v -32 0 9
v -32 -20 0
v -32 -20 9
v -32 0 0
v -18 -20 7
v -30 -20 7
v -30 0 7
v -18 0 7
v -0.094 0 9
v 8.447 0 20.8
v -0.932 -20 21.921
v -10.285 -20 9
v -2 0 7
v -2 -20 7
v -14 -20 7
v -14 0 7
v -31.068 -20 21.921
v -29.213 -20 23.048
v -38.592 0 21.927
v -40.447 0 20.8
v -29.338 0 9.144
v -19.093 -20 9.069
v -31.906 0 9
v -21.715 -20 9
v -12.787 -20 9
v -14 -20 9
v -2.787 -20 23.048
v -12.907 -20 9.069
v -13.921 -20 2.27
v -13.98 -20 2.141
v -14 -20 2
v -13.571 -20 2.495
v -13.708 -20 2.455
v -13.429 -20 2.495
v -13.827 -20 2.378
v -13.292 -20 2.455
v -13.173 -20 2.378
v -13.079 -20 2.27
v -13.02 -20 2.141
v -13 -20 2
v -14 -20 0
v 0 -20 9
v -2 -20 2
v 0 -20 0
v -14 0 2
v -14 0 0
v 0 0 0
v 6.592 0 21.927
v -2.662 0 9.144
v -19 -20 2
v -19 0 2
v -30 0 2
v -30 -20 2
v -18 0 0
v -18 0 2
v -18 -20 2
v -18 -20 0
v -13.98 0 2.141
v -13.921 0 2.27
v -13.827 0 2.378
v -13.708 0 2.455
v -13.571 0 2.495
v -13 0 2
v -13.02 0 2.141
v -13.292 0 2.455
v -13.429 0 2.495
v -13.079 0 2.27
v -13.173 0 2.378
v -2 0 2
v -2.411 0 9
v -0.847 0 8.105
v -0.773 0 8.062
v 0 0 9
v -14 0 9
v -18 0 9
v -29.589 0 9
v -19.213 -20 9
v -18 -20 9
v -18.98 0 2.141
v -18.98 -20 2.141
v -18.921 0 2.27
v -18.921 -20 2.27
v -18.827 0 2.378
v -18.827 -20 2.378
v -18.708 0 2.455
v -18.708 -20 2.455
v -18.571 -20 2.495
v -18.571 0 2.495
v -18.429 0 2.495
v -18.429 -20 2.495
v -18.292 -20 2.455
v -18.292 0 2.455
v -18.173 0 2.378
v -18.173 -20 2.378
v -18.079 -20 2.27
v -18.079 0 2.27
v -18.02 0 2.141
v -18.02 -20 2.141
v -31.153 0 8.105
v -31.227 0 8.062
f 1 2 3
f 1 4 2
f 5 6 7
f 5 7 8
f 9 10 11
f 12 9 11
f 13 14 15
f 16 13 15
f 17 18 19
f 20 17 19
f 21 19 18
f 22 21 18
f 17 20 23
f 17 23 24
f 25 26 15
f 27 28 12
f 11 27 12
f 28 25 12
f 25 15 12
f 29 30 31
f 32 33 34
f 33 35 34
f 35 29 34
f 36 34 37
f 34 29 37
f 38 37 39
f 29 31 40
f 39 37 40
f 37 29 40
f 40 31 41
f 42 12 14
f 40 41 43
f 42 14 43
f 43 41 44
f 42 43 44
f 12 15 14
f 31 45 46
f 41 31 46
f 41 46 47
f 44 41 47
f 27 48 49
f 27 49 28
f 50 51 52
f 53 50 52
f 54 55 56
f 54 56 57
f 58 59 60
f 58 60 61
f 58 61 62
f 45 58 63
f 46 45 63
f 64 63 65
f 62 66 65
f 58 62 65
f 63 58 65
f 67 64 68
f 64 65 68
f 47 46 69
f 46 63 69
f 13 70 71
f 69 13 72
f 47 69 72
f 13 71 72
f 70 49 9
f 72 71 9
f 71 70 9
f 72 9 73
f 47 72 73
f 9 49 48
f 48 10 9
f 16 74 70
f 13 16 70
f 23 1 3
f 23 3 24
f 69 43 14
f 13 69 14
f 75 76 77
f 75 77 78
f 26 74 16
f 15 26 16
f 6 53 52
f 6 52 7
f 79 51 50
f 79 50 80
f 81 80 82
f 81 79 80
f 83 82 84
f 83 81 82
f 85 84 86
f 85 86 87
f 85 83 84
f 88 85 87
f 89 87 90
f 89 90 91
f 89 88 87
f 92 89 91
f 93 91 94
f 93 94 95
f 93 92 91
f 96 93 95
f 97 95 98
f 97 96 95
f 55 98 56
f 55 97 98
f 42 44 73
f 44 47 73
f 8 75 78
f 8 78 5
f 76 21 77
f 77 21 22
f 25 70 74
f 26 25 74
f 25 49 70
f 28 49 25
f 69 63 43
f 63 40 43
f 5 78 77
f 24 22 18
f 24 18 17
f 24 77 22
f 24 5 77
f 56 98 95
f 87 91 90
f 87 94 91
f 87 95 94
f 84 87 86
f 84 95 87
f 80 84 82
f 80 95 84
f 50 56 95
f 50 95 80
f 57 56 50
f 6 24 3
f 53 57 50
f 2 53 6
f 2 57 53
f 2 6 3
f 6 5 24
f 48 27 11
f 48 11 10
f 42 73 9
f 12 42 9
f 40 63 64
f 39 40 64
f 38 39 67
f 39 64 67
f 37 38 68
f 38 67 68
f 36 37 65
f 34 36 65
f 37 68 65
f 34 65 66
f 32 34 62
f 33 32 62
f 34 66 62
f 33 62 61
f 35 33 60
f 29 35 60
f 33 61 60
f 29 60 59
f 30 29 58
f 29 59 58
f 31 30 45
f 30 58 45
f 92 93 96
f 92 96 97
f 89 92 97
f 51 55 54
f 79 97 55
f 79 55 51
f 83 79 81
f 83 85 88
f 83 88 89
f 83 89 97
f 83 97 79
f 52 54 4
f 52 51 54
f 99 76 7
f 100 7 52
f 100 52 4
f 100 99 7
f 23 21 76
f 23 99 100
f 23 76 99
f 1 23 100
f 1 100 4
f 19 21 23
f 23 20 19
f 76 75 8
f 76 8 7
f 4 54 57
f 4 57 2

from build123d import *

# Parameters (mm, degrees)
F1_DEPTH  = 20
F6_DEPTH  = 2
F8_DEPTH  = 25
F9_DEPTH  = 25
F10_W     = 12.9626411945
F10_H     = 6.1243779492
F11_DEPTH = 25
F12_DEPTH = 25


with BuildPart() as f1:
    # F0 (on Front) → F1 (new body)
    with BuildSketch(Plane.XZ):
        Polygon((-14, 0), (0, 0), (0, 9), (-14, 9), (-14, 7), (-2, 7), (-2, 2), (-13, 2), (-14, 2), align=None)
        with BuildLine():
            ThreePointArc((-13, 2), (-13.5, 2.5), (-14, 2))
            Line((-14, 2), (-13, 2))
        make_face()
    extrude(amount=F1_DEPTH)

    # F5 (on 3pt) → F6 (join)
    with BuildSketch(Plane(origin=(-5.2031719048, 2.651203998, 3.7666364803), x_dir=(-0.3090421951, -0.9243606592, 0.2237192288), z_dir=(-0.74875913, 0.3815198182, 0.5420354172))):
        Polygon((-1.0051657446, 6.932166405), (27.787854895, -1.1434078915), (30.5616781116, 15.7499015331), (-1.0051657446, 22.4486775696), align=None)
    extrude(amount=-F6_DEPTH)

    # F7 (on face) → F8 (join)
    with BuildSketch(Plane.XZ.offset(20)):
        Polygon((0, 9), (0, 9.8367398605), (-15.273751691, 9.8367398605), (-15.273751691, 6.7799971439), (-2, 6.7799971439), (-2, 7), (-14, 7), (-14, 9), align=None)
        Polygon((0, 6.7799971439), (0, 9), (-14, 9), (-14, 7), (-2, 7), (-2, 6.7799971439), align=None)
    extrude(amount=F8_DEPTH)

    # F9 (cut): a face of the model
    f9_faces = [f1.faces().sort_by_distance(p)[0] for p in [
        (-7.6368758455, -32.5, 6.7799971439),
    ]]
    extrude(f9_faces, amount=-F9_DEPTH, mode=Mode.SUBTRACT)

    # F10 (on face) → F11 (join)
    with BuildSketch(Plane(origin=(0, 0, 0), x_dir=(-1, 0, 0), z_dir=(0, 1, 0))):
        Polygon((7.1151028387, 7), (7.1151028387, 8.1046763808), (0.8471209144, 8.1046763808), (0.7732363719, 8.0623733808), (0.7426127396, 8.1046763808), (0, 8.1046763808), (0, 1.9802984316), (7.1151028387, 1.9802984316), (7.1151028387, 2), (2, 2), (2, 7), align=None)
        with Locations((-6.4813205972, 5.0424874062)):
            Rectangle(F10_W, F10_H)
    extrude(amount=F11_DEPTH)

    # F12 (cut): a face of the model
    f12_faces = [f1.faces().sort_by_distance(p)[0] for p in [
        (2.9237691779, 12.5, 1.9802984316),
    ]]
    extrude(f12_faces, amount=-F12_DEPTH, mode=Mode.SUBTRACT)


with BuildPart() as f14_1:
    # F14: instance of F1
    add(f1.part.mirror(Plane(origin=(-16, -10, 8), x_dir=(0, -1, 0), z_dir=(-1, 0, 0))))


solid = Compound([f1.part, f14_1.part])
